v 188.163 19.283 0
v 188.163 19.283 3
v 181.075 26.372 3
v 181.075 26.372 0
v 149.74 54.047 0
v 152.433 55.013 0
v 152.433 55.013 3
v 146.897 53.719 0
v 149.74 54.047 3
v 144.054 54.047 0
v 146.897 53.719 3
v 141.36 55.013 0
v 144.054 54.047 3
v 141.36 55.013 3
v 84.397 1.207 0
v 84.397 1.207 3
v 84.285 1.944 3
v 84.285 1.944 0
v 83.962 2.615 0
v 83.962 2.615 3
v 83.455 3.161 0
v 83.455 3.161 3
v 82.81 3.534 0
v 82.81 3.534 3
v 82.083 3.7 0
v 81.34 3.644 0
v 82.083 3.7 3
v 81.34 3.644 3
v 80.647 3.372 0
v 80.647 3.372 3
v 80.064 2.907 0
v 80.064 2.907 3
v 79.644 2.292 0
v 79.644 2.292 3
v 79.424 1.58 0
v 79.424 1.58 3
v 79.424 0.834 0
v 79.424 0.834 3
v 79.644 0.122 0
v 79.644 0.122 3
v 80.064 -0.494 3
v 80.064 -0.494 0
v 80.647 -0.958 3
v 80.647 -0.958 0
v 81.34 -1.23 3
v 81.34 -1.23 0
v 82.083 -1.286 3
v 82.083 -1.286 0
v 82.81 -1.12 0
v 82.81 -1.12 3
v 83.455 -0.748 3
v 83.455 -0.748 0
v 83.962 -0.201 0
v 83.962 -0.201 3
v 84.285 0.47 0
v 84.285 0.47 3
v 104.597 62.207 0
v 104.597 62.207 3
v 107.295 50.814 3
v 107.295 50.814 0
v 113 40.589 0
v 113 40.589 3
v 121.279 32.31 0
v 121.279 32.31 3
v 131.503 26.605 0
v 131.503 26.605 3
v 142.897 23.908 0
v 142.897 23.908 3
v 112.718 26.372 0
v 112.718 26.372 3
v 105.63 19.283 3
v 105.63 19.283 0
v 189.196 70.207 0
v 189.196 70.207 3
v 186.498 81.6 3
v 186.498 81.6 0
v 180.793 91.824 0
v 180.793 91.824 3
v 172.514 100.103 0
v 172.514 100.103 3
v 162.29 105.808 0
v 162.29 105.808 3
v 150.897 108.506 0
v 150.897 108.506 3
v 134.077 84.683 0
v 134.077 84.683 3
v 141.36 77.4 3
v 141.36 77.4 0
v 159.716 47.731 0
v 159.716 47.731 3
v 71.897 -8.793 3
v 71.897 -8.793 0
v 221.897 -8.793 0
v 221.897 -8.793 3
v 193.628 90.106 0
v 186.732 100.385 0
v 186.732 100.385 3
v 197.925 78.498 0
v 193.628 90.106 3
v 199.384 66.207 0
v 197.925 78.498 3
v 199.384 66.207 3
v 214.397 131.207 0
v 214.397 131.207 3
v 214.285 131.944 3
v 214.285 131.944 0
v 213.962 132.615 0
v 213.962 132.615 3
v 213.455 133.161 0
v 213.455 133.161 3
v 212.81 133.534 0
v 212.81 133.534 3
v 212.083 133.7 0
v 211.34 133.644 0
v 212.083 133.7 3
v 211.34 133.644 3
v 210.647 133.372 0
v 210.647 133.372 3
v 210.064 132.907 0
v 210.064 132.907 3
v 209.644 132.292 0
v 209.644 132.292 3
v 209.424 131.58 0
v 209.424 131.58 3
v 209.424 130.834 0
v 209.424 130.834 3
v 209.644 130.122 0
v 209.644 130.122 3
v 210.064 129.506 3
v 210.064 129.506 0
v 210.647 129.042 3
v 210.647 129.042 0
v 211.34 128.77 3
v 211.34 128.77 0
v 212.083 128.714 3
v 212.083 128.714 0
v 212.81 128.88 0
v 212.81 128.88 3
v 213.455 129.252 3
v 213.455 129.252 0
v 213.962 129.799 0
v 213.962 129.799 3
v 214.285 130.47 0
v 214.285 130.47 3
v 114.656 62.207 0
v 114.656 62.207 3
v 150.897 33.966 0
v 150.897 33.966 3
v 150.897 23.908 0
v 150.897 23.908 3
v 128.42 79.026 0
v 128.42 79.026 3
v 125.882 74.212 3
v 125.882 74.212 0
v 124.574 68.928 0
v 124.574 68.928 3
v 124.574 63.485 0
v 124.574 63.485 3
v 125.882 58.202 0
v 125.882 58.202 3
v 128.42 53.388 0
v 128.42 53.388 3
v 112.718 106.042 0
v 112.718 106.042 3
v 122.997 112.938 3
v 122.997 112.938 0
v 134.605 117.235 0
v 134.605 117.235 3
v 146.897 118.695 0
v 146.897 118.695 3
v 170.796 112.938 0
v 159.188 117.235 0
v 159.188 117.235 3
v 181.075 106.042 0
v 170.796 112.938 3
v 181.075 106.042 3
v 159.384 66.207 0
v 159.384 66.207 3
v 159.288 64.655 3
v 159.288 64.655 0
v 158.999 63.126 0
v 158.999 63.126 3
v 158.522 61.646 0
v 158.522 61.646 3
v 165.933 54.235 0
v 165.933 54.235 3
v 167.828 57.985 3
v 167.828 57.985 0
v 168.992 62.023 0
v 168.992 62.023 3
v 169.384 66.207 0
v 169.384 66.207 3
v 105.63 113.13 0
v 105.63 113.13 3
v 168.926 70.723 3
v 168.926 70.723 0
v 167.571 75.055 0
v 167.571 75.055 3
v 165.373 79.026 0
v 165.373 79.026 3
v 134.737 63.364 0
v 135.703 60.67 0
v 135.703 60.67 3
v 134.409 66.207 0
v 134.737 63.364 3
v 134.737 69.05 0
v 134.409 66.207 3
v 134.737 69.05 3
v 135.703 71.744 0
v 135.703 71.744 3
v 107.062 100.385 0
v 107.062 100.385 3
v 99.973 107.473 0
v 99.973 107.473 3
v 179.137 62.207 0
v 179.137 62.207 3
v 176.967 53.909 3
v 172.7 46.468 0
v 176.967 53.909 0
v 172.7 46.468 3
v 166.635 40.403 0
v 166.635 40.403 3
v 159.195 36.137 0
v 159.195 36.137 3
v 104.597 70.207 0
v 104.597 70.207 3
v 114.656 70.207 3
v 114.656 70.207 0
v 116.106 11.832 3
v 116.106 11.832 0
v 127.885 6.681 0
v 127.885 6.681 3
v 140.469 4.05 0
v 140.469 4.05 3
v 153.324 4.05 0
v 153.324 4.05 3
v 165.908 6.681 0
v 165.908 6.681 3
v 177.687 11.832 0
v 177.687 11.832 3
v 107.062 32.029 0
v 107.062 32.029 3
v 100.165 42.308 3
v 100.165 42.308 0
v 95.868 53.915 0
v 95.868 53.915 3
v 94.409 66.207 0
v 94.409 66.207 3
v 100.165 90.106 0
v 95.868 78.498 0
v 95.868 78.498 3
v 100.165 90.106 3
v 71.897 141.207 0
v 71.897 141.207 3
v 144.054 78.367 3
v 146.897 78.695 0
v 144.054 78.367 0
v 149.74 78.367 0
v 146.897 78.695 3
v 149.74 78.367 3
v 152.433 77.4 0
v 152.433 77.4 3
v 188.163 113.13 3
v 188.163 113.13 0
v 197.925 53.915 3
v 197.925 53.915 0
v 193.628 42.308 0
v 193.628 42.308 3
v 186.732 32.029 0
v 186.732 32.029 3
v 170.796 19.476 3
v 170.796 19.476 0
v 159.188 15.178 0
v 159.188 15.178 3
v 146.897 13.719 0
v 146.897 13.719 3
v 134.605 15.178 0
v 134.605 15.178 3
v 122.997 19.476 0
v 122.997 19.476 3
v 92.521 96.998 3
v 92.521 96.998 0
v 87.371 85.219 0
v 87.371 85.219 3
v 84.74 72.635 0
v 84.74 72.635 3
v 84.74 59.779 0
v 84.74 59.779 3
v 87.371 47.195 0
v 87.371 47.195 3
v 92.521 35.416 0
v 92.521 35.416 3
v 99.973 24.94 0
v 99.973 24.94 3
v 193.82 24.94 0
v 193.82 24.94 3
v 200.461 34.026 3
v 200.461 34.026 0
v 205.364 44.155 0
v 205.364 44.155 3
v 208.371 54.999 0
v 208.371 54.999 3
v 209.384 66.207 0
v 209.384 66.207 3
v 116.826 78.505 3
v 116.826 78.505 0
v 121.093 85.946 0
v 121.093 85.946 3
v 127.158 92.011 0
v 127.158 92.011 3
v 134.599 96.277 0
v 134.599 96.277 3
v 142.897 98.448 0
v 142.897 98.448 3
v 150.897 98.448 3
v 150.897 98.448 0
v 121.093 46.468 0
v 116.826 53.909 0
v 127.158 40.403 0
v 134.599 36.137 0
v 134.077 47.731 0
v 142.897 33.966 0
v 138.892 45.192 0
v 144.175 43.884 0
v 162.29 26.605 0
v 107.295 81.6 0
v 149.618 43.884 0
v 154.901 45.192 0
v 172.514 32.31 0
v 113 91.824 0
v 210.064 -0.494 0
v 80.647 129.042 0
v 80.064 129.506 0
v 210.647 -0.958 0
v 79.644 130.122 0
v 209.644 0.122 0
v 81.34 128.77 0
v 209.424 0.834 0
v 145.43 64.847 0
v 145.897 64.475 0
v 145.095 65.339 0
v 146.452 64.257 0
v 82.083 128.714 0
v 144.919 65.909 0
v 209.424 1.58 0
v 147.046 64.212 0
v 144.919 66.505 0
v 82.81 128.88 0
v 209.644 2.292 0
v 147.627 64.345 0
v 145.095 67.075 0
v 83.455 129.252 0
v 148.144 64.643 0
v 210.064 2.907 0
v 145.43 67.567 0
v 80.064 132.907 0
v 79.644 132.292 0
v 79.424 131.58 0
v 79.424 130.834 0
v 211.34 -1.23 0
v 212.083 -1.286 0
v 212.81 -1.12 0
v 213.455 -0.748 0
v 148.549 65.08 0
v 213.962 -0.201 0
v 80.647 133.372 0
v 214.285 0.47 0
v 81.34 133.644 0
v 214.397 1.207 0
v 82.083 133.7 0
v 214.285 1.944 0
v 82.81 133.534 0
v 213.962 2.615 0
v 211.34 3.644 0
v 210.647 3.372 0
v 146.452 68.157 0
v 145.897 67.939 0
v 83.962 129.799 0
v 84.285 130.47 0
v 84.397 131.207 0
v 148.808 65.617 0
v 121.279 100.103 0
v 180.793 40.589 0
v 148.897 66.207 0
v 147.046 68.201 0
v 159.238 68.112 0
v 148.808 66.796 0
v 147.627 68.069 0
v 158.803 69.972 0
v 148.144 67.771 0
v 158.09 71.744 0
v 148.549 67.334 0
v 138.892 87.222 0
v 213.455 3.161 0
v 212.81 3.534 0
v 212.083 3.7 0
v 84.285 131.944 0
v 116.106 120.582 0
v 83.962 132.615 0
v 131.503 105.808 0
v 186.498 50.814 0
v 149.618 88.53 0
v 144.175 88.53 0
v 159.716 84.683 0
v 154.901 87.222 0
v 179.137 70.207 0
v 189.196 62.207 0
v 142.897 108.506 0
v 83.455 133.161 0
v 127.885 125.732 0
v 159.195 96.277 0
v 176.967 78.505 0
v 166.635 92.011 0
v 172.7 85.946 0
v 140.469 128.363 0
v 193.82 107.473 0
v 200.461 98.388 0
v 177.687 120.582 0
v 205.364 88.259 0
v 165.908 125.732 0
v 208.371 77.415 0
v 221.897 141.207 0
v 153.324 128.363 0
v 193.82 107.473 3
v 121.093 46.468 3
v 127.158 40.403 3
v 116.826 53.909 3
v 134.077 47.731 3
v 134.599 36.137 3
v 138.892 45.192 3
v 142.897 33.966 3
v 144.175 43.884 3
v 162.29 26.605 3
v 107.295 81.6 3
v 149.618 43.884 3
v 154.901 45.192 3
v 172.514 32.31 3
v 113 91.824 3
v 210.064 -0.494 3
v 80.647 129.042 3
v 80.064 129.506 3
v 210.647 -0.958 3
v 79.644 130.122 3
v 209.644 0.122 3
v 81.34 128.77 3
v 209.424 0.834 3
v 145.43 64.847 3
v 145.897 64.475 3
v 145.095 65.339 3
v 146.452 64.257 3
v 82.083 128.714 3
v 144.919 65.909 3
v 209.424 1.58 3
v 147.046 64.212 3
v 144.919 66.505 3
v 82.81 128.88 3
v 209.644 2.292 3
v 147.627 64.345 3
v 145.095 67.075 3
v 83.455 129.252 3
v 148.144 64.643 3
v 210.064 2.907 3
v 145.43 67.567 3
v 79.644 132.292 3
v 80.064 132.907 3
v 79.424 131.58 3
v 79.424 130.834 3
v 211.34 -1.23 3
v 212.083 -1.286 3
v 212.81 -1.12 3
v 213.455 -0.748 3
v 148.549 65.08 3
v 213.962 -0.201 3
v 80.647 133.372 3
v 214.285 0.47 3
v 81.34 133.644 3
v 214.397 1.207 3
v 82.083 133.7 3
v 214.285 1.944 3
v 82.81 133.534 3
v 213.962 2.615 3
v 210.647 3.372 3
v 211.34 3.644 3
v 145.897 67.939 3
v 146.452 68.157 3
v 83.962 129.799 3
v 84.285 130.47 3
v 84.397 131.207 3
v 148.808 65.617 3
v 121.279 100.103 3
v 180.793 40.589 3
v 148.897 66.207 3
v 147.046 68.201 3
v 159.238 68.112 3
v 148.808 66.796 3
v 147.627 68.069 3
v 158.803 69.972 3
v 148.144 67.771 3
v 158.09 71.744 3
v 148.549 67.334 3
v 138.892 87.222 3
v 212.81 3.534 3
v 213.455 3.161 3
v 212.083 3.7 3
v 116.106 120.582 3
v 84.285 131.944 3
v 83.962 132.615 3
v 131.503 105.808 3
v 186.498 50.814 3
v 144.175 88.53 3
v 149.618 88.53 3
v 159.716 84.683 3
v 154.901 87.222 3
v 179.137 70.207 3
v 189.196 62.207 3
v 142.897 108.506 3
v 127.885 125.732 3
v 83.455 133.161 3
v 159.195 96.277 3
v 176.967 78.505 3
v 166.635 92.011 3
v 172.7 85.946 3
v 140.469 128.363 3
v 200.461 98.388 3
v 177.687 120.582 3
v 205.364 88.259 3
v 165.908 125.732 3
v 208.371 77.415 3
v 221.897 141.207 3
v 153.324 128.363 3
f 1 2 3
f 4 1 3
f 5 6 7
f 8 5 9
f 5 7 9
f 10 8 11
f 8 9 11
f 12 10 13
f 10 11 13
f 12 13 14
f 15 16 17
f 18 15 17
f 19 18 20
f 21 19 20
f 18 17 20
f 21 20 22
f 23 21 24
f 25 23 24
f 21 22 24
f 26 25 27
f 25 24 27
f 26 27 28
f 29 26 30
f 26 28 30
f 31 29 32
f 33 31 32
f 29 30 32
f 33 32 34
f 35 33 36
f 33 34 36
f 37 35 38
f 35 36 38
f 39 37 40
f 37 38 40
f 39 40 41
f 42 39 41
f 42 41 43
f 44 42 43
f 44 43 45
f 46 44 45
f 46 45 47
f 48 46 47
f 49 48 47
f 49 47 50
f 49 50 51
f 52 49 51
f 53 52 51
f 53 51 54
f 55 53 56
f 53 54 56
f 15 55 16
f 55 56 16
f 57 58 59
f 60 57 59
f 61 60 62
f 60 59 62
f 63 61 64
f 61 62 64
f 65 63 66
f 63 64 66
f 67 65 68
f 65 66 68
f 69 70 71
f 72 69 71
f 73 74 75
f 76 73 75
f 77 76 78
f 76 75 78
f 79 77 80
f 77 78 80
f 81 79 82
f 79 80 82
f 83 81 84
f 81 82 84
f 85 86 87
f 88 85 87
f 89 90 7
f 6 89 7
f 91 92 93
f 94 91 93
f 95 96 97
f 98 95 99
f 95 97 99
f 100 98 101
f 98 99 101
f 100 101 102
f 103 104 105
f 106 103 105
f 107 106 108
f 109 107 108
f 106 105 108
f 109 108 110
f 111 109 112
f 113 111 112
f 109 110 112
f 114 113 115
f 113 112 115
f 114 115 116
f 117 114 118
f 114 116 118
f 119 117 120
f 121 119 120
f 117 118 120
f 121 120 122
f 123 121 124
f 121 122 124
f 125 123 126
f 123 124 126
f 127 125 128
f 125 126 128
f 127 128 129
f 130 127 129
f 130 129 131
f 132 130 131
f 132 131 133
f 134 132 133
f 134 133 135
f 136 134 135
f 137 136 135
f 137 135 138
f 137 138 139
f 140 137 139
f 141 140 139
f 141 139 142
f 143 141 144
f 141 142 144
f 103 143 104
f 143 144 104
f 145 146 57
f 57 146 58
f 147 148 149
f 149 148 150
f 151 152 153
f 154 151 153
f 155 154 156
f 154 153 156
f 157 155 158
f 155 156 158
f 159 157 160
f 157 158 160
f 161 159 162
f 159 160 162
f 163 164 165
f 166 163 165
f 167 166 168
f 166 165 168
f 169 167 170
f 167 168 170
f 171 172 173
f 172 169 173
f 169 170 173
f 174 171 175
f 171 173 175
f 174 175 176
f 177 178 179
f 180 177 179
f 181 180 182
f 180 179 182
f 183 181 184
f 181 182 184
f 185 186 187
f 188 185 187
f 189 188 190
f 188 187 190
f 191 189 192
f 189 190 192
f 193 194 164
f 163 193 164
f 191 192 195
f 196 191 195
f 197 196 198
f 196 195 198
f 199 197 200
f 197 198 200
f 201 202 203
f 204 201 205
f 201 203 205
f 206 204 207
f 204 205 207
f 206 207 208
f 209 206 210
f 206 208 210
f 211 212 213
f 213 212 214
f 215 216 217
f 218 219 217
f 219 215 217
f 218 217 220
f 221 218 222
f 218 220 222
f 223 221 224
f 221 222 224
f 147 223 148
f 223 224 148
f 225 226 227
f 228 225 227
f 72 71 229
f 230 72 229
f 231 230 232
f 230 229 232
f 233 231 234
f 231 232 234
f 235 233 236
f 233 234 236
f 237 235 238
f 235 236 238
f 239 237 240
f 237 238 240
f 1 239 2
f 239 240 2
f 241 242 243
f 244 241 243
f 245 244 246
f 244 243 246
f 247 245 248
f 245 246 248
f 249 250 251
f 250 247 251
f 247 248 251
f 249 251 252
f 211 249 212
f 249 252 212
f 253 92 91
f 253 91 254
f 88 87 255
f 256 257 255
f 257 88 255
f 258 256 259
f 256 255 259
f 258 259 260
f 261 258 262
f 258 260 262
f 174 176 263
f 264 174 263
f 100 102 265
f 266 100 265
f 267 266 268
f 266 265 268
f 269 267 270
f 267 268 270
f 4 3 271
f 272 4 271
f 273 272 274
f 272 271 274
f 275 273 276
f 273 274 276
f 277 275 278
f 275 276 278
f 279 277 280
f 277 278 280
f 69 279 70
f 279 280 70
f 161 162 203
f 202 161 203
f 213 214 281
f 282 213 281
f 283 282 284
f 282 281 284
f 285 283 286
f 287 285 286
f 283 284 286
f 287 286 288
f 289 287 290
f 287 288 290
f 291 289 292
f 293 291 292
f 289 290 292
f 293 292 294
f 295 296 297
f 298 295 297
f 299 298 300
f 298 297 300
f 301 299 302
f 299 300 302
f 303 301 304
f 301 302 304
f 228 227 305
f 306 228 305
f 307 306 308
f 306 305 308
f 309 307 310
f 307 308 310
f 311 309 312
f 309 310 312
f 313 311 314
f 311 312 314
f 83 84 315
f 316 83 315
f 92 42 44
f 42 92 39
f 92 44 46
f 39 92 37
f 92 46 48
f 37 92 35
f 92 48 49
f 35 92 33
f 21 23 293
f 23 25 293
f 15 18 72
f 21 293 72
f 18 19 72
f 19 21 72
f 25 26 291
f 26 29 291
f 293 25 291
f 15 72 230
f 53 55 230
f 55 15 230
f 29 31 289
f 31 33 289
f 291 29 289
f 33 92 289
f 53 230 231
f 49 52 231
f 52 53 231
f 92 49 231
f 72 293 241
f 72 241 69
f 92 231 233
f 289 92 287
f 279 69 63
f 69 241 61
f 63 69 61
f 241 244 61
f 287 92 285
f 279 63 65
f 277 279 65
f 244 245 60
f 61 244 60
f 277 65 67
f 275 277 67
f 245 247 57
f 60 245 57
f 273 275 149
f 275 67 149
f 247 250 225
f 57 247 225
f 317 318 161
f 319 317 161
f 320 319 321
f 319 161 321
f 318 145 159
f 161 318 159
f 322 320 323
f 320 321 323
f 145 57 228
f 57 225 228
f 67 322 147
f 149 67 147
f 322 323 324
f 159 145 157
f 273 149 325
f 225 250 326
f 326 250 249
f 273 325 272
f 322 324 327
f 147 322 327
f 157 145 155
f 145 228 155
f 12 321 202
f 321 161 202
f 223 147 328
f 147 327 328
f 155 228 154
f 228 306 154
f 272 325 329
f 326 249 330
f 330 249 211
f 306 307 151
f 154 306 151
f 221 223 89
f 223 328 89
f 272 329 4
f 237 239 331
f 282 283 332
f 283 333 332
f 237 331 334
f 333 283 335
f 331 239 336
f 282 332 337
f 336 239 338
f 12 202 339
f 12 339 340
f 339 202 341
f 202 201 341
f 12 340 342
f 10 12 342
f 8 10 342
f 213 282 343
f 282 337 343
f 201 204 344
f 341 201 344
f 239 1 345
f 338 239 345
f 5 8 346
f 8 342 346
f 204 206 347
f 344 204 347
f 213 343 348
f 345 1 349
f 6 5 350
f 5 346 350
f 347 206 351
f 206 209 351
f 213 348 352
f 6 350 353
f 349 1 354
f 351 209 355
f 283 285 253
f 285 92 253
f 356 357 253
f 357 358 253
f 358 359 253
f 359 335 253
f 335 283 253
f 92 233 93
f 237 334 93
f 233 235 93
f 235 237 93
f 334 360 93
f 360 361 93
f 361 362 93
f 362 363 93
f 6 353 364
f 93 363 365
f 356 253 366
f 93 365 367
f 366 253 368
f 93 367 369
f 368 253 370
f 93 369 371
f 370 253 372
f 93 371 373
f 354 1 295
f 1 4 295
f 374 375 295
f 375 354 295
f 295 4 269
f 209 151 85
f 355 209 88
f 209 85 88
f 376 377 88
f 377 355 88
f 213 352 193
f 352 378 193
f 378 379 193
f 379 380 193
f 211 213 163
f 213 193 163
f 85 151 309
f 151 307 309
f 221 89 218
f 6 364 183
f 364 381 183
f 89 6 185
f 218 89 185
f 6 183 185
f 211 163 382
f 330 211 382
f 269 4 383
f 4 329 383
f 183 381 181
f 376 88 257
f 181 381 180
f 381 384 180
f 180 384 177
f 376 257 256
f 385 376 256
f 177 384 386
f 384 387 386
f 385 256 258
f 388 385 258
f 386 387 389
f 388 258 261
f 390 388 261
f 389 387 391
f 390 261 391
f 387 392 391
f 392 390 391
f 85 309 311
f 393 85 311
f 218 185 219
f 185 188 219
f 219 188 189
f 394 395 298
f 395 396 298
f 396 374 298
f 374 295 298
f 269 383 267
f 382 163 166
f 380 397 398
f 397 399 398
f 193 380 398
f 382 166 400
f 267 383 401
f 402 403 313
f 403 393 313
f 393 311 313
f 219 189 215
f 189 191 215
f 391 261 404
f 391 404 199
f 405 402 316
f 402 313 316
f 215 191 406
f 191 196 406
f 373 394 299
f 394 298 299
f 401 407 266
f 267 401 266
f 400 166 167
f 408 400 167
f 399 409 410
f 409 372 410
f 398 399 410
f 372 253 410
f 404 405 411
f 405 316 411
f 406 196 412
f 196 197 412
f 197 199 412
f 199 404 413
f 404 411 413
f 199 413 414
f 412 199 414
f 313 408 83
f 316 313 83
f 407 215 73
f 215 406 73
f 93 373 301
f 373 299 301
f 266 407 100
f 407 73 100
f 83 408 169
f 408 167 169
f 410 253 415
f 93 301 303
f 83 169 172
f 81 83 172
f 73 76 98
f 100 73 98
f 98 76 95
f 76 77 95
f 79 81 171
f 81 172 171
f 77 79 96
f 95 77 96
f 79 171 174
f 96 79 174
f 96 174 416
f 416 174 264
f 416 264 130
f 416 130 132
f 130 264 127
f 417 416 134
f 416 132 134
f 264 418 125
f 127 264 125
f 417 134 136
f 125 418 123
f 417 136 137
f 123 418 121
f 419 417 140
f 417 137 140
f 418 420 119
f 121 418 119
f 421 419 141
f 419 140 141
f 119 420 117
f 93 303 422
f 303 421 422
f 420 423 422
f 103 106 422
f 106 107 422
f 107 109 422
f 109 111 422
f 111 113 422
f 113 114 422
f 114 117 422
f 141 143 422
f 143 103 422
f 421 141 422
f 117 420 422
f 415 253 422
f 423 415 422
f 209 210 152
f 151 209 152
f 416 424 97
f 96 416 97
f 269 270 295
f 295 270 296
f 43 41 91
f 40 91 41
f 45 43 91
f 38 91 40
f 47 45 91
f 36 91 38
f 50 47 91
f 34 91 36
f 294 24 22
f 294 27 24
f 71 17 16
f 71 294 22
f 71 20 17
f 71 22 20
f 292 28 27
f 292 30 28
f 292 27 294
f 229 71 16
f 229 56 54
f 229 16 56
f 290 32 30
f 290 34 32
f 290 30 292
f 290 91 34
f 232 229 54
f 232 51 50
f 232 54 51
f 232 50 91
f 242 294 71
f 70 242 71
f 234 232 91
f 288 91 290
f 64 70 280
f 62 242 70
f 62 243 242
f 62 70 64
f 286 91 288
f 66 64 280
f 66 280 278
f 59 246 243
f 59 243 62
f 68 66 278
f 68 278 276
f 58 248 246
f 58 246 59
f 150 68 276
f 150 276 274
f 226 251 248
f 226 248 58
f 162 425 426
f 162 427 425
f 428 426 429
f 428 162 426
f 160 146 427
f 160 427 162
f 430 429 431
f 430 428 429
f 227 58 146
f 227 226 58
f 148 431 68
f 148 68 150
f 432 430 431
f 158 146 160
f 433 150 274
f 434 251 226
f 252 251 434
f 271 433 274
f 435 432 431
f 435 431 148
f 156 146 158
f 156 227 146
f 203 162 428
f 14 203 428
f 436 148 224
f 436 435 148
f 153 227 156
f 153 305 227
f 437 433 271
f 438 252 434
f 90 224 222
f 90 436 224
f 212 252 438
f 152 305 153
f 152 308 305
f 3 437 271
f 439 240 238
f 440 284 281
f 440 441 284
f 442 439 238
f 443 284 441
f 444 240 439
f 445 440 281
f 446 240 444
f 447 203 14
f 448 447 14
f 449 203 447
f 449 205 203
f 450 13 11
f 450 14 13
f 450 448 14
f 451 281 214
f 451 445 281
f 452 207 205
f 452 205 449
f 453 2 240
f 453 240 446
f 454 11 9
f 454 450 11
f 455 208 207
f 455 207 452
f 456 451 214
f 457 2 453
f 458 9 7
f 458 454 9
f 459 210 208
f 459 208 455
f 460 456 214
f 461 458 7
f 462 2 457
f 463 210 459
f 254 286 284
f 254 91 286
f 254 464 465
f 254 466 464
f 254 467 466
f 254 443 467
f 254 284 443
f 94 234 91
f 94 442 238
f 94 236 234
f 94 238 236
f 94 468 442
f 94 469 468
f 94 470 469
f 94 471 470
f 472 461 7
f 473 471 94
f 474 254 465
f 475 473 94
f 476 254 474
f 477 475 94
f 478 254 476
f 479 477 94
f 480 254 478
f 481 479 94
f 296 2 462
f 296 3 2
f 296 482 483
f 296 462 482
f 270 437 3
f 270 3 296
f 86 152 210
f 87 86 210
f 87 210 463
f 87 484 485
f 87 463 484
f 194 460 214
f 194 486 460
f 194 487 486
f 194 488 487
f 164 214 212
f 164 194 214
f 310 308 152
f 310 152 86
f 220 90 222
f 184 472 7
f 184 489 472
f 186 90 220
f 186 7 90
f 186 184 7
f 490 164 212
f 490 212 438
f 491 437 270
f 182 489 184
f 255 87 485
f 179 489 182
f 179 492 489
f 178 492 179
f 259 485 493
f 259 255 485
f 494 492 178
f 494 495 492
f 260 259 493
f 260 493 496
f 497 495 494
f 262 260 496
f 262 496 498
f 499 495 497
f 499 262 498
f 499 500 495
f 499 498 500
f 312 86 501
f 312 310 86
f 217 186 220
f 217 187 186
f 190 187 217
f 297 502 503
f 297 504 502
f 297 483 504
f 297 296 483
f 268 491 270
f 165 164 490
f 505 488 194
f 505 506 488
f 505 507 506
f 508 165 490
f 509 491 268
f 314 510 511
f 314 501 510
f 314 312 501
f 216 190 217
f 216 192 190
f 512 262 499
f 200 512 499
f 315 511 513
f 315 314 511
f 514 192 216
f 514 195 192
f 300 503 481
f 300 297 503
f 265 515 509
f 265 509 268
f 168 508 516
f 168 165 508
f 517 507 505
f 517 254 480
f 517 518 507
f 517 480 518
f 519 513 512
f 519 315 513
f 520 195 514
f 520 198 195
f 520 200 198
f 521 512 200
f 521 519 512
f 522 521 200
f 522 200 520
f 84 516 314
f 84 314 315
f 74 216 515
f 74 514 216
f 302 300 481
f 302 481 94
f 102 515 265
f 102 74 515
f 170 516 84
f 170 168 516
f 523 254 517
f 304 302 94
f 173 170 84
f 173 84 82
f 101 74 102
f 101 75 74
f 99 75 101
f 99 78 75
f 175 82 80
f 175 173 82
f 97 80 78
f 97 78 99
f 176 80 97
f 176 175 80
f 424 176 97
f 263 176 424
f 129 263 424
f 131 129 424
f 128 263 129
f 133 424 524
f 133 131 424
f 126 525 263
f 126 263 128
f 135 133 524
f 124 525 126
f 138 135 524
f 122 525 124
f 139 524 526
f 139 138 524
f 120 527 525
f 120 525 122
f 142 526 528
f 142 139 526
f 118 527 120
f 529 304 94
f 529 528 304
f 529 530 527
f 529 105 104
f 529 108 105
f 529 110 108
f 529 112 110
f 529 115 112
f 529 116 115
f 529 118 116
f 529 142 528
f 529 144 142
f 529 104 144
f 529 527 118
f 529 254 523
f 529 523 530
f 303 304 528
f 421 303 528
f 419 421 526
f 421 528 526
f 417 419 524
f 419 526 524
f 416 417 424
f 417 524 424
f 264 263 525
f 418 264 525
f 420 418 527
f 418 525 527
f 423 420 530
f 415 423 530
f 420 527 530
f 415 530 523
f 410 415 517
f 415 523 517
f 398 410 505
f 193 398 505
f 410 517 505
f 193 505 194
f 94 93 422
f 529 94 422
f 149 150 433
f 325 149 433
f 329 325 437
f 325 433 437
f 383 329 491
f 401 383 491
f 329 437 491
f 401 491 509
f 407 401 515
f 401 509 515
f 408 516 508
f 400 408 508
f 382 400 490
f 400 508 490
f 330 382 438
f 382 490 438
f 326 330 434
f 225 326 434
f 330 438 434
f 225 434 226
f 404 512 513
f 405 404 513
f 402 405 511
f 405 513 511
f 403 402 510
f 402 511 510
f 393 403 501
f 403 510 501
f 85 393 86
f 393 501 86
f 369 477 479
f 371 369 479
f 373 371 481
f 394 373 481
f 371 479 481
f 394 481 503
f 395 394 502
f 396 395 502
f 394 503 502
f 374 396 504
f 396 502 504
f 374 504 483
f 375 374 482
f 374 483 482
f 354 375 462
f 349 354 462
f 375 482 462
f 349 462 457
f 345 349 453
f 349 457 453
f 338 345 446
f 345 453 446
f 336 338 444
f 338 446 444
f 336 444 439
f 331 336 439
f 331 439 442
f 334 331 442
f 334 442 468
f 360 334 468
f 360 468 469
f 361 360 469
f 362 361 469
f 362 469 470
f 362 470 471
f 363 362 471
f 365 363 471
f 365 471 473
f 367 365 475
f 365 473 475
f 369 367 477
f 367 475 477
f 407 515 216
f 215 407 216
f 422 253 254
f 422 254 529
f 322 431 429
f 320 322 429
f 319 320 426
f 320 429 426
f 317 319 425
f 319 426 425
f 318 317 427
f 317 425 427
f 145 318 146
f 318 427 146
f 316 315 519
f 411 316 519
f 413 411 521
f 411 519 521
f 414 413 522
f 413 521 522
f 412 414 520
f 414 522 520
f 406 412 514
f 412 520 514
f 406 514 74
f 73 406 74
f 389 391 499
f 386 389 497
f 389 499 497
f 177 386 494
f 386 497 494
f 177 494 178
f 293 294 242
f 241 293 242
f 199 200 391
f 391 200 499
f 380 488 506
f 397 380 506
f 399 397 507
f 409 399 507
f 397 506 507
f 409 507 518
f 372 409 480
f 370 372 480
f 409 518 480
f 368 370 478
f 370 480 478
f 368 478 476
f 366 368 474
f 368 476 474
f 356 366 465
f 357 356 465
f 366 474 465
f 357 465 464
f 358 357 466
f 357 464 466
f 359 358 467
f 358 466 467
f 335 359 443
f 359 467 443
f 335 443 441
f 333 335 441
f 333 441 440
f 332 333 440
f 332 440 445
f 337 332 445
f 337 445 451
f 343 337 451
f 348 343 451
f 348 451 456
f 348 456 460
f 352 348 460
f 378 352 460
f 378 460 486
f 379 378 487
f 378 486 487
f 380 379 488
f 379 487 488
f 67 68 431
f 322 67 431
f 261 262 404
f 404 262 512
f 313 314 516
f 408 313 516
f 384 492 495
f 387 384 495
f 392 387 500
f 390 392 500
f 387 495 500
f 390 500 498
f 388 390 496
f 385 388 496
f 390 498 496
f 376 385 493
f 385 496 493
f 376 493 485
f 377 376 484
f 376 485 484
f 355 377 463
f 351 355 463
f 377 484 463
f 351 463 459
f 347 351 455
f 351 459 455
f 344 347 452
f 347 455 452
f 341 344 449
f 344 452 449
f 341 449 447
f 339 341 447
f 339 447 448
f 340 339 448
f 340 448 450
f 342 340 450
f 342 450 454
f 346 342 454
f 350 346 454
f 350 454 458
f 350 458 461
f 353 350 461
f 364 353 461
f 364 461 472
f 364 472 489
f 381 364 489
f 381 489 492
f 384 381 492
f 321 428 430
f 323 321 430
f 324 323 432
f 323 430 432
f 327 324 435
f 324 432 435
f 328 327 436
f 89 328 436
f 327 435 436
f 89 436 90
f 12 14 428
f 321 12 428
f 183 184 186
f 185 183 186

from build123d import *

# Parameters (mm, degrees)
SKETCH1_W           = 150
SKETCH1_H           = 150
BOSS_EXTRUDE1_DEPTH = 3
CUT_EXTRUDE1_DEPTH  = 264.0332057
SKETCH4_R           = 2.5
CUT_EXTRUDE2_DEPTH  = 3
SKETCH5_R           = 2
CUT_EXTRUDE3_DEPTH  = 10


with BuildPart() as part:
    # Sketch1 → Boss-Extrude1 (new body)
    with BuildSketch(Plane.XY):
        with Locations((146.896551724, 66.206896552)):
            Rectangle(SKETCH1_W, SKETCH1_H)
    extrude(amount=BOSS_EXTRUDE1_DEPTH)

    # Sketch2 → Cut-Extrude1 (cut, through all)
    with BuildSketch(Plane.XY.offset(3)):
        with BuildLine():
            ThreePointArc((188.163122783, 113.13032186), (146.896551724, 128.694797217), (105.629980666, 113.13032186))
            Line((105.629980666, 113.13032186), (112.718359737, 106.041942789))
            ThreePointArc((112.718359737, 106.041942789), (146.896551724, 118.694797217), (181.074743712, 106.041942789))
            Line((181.074743712, 106.041942789), (188.163122783, 113.13032186))
        make_face()
        with BuildLine():
            Line((107.061505487, 100.385088539), (99.973126416, 107.47346761))
            ThreePointArc((99.973126416, 107.47346761), (84.408651059, 66.206896552), (99.973126416, 24.940325493))
            Line((99.973126416, 24.940325493), (107.061505487, 32.028704564))
            ThreePointArc((107.061505487, 32.028704564), (94.408651059, 66.206896552), (107.061505487, 100.385088539))
        make_face()
        with BuildLine():
            ThreePointArc((209.384452389, 66.206896552), (205.363995952, 88.259009716), (193.819977032, 107.47346761))
            Line((193.819977032, 107.47346761), (186.731597961, 100.385088539))
            ThreePointArc((186.731597961, 100.385088539), (196.119705149, 84.429434333), (199.384452389, 66.206896552))
            ThreePointArc((199.384452389, 66.206896552), (196.119705149, 47.984358771), (186.731597961, 32.028704564))
            Line((186.731597961, 32.028704564), (193.819977032, 24.940325493))
            ThreePointArc((193.819977032, 24.940325493), (205.363995952, 44.154783387), (209.384452389, 66.206896552))
        make_face()
        with BuildLine():
            Line((112.718359737, 26.371850315), (105.629980666, 19.283471244))
            ThreePointArc((105.629980666, 19.283471244), (146.896551724, 3.718995886), (188.163122783, 19.283471244))
            Line((188.163122783, 19.283471244), (181.074743712, 26.371850315))
            ThreePointArc((181.074743712, 26.371850315), (146.896551724, 13.718995886), (112.718359737, 26.371850315))
        make_face()
        with BuildLine():
            ThreePointArc((150.896551724, 23.907703853), (176.940034403, 36.163413873), (189.195744423, 62.206896552))
            Line((189.195744423, 62.206896552), (179.137266506, 62.206896552))
            ThreePointArc((179.137266506, 62.206896552), (169.868966591, 43.234481685), (150.896551724, 33.96618177))
            Line((150.896551724, 33.96618177), (150.896551724, 23.907703853))
        make_face()
        with BuildLine():
            Line((114.655836942, 62.206896552), (104.597359026, 62.206896552))
            ThreePointArc((104.597359026, 62.206896552), (116.853069045, 36.163413873), (142.896551724, 23.907703853))
            Line((142.896551724, 23.907703853), (142.896551724, 33.96618177))
            ThreePointArc((142.896551724, 33.96618177), (123.924136857, 43.234481685), (114.655836942, 62.206896552))
        make_face()
        with BuildLine():
            Line((142.896551724, 98.447611333), (142.896551724, 108.50608925))
            ThreePointArc((142.896551724, 108.50608925), (116.853069045, 96.250379231), (104.597359026, 70.206896552))
            Line((104.597359026, 70.206896552), (114.655836942, 70.206896552))
            ThreePointArc((114.655836942, 70.206896552), (123.924136857, 89.179311419), (142.896551724, 98.447611333))
        make_face()
        with BuildLine():
            ThreePointArc((189.195744423, 70.206896552), (176.940034403, 96.250379231), (150.896551724, 108.50608925))
            Line((150.896551724, 108.50608925), (150.896551724, 98.447611333))
            ThreePointArc((150.896551724, 98.447611333), (169.868966591, 89.179311419), (179.137266506, 70.206896552))
            Line((179.137266506, 70.206896552), (189.195744423, 70.206896552))
        make_face()
        with BuildLine():
            Line((165.372753073, 79.026243651), (158.090015102, 71.74350568))
            ThreePointArc((158.090015102, 71.74350568), (159.056537781, 69.049853135), (159.384452389, 66.206896552))
            ThreePointArc((159.384452389, 66.206896552), (159.166880972, 63.885973637), (158.521748029, 61.645923641))
            Line((158.521748029, 61.645923641), (165.932760465, 54.234911206))
            ThreePointArc((165.932760465, 54.234911206), (168.504305512, 59.977076926), (169.384452389, 66.206896552))
            ThreePointArc((169.384452389, 66.206896552), (168.358106385, 72.923096956), (165.372753073, 79.026243651))
        make_face()
        with BuildLine():
            Line((134.077204625, 84.6830979), (141.359942596, 77.400359929))
            ThreePointArc((141.359942596, 77.400359929), (146.896551724, 78.694797217), (152.433160852, 77.400359929))
            Line((152.433160852, 77.400359929), (159.715898823, 84.6830979))
            ThreePointArc((159.715898823, 84.6830979), (146.896551724, 88.694797217), (134.077204625, 84.6830979))
        make_face()
        with BuildLine():
            ThreePointArc((135.703088346, 60.670287424), (134.408651059, 66.206896552), (135.703088346, 71.74350568))
            Line((135.703088346, 71.74350568), (128.420350375, 79.026243651))
            ThreePointArc((128.420350375, 79.026243651), (124.408651059, 66.206896552), (128.420350375, 53.387549452))
            Line((128.420350375, 53.387549452), (135.703088346, 60.670287424))
        make_face()
        with BuildLine():
            ThreePointArc((152.433160852, 55.013433174), (146.896551724, 53.718995886), (141.359942596, 55.013433174))
            Line((141.359942596, 55.013433174), (134.077204625, 47.730695203))
            ThreePointArc((134.077204625, 47.730695203), (146.896551724, 43.718995886), (159.715898823, 47.730695203))
            Line((159.715898823, 47.730695203), (152.433160852, 55.013433174))
        make_face()
    extrude(amount=-CUT_EXTRUDE1_DEPTH, mode=Mode.SUBTRACT)

    # Sketch4 → Cut-Extrude2 (cut)
    with BuildSketch(Plane.XY.offset(3)):
        with Locations((81.896551724, 131.206896552)):
            Circle(SKETCH4_R)
        with Locations((211.896551724, 131.206896552)):
            Circle(SKETCH4_R)
        with Locations((211.896551724, 1.206896552)):
            Circle(SKETCH4_R)
        with Locations((81.896551724, 1.206896552)):
            Circle(SKETCH4_R)
    extrude(amount=-CUT_EXTRUDE2_DEPTH, mode=Mode.SUBTRACT)

    # Sketch5 → Cut-Extrude3 (cut)
    with BuildSketch(Plane.XY.offset(3)):
        with Locations((146.896551724, 66.206896552)):
            Circle(SKETCH5_R)
    extrude(amount=-CUT_EXTRUDE3_DEPTH, mode=Mode.SUBTRACT)


solid = part.part
